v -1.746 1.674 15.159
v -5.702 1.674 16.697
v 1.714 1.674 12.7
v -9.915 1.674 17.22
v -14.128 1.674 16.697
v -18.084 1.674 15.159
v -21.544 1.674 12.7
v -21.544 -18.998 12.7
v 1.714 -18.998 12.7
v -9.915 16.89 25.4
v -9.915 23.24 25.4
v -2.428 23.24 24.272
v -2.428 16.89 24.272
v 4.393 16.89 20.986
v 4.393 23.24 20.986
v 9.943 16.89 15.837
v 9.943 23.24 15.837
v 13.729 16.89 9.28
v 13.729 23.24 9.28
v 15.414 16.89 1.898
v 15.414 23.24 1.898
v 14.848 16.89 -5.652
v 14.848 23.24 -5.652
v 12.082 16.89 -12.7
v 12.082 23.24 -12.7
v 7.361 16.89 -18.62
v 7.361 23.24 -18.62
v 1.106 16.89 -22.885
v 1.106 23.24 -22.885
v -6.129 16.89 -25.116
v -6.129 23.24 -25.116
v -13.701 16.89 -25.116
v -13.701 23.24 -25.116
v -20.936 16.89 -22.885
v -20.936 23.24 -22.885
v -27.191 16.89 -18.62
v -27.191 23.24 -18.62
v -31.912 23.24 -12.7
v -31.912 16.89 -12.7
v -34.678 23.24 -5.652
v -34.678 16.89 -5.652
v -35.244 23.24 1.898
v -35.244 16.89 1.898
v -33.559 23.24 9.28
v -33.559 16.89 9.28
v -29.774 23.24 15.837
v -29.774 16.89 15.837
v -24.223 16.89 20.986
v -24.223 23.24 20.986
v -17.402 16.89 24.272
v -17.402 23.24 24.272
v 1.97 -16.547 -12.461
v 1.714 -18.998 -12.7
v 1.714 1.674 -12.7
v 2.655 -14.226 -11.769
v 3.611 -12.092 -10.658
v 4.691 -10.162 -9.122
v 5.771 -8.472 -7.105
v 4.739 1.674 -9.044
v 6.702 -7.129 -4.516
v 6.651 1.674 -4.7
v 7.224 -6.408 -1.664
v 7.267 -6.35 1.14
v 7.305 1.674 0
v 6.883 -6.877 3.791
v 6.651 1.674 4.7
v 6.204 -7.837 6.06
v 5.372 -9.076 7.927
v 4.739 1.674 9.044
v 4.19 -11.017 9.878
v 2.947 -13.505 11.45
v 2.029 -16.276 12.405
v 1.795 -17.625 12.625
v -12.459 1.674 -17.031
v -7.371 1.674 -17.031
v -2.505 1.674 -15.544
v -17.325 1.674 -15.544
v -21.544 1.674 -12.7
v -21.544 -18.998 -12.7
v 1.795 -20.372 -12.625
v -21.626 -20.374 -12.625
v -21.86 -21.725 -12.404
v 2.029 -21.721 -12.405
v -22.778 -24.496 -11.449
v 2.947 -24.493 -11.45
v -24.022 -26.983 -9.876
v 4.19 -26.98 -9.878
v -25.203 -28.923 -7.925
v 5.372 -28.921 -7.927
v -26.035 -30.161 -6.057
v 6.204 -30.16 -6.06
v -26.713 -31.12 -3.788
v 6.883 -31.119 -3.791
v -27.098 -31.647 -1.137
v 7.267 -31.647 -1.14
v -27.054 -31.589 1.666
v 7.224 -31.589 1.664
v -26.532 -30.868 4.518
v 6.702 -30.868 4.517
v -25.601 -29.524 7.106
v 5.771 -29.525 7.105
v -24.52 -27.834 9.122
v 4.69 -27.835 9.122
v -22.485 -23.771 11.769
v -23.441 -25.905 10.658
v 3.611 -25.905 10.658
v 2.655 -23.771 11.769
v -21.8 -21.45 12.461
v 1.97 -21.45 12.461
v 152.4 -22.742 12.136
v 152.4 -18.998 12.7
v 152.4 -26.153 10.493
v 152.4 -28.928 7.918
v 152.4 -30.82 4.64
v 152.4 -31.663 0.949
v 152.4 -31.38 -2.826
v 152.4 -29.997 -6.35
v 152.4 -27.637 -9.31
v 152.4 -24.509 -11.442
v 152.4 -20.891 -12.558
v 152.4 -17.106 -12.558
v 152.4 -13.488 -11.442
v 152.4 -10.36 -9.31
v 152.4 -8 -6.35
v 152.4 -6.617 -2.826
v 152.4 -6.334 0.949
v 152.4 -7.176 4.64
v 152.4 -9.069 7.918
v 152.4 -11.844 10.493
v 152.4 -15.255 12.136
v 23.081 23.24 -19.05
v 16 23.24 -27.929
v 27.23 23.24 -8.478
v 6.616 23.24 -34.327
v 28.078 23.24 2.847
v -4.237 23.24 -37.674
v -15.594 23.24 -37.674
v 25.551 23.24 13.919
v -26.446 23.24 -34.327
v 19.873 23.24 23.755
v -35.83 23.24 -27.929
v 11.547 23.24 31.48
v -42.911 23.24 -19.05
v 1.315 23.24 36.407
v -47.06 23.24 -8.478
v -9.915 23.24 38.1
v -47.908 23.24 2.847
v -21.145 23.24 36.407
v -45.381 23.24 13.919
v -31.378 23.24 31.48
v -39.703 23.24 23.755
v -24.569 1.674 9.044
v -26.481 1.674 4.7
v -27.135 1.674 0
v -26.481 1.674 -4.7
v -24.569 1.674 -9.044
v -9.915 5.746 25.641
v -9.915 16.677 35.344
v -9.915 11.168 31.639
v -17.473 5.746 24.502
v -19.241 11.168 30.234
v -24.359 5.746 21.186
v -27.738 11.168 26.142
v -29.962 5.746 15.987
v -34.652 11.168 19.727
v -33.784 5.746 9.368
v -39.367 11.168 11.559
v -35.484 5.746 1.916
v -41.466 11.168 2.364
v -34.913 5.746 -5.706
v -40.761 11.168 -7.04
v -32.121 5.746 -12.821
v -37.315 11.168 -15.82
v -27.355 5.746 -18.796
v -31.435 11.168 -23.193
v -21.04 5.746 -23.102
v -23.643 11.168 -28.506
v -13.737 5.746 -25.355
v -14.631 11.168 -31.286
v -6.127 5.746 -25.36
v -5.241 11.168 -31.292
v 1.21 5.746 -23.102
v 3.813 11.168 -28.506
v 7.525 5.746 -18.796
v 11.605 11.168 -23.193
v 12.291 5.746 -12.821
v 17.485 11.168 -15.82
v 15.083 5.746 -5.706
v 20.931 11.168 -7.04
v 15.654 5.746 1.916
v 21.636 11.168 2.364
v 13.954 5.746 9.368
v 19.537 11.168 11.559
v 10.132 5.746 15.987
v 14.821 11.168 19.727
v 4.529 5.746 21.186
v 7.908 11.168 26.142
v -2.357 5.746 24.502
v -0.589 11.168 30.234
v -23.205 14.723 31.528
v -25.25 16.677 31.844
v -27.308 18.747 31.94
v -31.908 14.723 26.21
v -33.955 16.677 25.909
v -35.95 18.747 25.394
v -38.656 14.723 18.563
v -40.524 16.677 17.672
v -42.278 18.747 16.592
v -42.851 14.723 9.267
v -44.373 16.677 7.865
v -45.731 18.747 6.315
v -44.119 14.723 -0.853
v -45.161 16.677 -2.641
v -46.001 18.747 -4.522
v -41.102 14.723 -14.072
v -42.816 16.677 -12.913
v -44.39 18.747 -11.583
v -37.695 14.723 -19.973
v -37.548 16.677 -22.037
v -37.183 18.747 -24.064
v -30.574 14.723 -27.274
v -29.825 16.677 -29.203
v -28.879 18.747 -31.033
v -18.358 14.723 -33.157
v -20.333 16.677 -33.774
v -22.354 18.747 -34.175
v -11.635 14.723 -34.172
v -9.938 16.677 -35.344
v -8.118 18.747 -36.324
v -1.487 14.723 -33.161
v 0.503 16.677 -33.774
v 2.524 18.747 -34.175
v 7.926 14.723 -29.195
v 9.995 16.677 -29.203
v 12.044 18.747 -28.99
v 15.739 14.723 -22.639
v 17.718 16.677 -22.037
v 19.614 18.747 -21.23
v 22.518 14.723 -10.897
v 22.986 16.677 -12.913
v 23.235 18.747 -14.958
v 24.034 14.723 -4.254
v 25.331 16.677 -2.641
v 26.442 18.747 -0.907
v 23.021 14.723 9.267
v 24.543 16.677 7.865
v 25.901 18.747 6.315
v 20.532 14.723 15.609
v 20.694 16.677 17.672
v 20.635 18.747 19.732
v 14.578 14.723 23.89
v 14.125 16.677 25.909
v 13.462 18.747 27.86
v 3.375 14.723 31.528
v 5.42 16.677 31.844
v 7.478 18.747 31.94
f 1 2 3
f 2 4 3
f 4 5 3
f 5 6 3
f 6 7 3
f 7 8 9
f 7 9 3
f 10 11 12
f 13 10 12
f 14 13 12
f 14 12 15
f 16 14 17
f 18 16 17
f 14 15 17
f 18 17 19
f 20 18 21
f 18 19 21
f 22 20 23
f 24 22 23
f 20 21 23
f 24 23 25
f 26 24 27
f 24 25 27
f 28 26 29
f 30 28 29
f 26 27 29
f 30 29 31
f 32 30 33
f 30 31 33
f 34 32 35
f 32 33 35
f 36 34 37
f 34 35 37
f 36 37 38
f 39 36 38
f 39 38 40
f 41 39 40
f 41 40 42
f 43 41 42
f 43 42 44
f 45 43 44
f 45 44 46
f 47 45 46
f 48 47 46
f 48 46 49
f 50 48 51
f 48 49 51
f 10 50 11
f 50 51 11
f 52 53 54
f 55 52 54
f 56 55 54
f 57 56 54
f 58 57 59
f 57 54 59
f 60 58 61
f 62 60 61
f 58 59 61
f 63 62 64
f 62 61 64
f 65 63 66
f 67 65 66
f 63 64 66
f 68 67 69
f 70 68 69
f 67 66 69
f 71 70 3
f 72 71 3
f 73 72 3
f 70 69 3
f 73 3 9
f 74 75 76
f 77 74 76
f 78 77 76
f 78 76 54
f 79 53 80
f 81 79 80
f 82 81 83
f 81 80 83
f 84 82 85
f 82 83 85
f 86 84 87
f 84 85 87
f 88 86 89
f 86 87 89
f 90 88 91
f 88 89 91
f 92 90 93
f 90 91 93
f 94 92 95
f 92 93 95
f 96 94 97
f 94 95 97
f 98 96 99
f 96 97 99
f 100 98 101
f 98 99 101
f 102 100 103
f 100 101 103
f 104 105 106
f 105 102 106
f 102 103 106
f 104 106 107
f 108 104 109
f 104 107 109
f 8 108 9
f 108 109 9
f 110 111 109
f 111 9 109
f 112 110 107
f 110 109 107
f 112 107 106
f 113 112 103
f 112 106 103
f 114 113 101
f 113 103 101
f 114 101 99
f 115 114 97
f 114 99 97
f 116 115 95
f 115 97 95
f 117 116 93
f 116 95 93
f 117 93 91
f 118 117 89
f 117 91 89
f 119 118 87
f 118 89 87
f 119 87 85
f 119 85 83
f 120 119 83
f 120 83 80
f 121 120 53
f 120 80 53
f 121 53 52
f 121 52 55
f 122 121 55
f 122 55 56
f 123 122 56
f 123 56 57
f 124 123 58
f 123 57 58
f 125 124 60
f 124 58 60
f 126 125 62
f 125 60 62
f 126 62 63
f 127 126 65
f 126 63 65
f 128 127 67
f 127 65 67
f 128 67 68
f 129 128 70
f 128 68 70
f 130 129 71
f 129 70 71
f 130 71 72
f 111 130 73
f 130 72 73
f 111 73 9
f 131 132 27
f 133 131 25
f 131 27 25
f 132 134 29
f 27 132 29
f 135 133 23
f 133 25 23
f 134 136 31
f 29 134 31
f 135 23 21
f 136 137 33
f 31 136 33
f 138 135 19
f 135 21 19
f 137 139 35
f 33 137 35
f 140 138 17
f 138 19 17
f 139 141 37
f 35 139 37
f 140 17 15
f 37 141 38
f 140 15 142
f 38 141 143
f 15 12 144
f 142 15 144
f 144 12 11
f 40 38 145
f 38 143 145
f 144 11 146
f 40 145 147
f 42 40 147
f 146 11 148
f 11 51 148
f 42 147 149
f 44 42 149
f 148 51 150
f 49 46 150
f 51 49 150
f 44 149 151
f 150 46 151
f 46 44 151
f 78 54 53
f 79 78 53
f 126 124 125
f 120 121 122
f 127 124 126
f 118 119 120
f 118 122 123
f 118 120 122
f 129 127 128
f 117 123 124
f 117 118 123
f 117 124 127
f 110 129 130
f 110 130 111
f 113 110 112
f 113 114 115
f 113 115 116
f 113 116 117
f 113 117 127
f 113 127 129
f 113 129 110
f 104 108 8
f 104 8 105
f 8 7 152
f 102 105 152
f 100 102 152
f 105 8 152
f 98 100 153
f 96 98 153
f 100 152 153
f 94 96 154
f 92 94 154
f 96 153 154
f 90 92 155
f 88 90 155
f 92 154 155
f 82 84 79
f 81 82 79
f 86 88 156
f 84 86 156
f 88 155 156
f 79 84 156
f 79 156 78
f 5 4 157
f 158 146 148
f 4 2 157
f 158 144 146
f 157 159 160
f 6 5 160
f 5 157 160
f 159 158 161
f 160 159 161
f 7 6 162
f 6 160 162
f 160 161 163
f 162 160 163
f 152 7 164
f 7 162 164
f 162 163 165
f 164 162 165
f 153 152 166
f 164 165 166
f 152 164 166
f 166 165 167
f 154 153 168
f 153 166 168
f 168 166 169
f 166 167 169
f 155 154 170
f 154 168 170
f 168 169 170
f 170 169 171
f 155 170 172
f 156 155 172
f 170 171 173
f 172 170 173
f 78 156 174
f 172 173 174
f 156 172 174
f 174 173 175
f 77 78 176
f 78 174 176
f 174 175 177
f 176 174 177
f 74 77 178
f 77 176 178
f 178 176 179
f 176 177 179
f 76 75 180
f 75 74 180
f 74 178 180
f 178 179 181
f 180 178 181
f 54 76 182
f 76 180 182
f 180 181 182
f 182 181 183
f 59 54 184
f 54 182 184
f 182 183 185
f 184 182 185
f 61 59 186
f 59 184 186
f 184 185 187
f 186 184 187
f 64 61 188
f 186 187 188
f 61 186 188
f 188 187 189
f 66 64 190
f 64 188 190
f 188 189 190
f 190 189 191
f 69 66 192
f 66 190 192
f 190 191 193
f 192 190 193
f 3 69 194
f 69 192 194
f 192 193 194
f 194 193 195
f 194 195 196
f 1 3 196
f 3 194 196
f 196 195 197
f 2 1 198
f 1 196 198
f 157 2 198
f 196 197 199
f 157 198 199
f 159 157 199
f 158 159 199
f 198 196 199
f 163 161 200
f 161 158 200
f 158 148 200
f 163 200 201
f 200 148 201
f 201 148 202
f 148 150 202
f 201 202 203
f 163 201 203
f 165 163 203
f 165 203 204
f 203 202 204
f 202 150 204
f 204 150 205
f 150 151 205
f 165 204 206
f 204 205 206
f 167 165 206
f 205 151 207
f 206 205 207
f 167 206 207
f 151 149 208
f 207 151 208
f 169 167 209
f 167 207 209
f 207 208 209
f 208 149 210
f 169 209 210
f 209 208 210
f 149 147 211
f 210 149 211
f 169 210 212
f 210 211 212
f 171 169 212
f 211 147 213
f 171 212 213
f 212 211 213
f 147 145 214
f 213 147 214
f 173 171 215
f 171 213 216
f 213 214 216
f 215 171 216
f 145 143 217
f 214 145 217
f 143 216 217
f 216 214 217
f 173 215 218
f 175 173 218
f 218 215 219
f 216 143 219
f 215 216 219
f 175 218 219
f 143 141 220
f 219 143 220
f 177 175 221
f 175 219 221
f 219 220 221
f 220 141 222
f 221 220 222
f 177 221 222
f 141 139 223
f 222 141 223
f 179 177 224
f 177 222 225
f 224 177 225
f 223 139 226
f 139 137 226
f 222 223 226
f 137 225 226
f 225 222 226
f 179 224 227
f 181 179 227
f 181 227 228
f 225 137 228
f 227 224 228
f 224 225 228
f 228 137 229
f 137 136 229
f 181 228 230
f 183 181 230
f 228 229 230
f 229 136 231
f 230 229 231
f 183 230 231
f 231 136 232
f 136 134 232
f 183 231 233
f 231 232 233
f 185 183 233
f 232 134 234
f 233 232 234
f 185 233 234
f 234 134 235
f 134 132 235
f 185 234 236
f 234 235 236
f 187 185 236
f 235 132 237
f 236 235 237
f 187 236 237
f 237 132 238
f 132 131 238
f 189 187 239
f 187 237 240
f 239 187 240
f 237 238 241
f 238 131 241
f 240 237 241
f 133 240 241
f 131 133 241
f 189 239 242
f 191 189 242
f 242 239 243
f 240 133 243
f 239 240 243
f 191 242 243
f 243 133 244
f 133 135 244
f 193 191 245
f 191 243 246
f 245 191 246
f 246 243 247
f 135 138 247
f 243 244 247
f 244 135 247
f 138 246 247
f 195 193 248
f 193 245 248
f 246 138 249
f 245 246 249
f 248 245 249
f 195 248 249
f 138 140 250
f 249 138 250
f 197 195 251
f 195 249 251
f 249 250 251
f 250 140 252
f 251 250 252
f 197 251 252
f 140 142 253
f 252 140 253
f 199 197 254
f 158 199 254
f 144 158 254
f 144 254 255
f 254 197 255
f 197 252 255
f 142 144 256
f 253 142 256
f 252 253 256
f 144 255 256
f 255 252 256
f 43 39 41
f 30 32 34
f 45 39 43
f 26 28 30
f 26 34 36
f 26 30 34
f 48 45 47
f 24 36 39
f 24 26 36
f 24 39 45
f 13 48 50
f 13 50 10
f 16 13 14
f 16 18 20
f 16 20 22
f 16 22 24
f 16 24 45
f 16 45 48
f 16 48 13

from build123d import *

# Parameters (mm, degrees)
BOSS_EXTRUDE1_DEPTH      = 50.8
BOSS_EXTRUDE1_DEPTH_BACK = 101.6
SKETCH2_R                = 12.7
CUT_EXTRUDE2_DEPTH       = 159.628919589
SKETCH4_R                = 25.4
CUT_EXTRUDE3_DEPTH       = 6.35


with BuildPart() as part:
    # Sketch1 → Revolve1 (revolve)
    with BuildSketch(Plane.XY, mode=Mode.PRIVATE) as revolve1_sk:
        with BuildLine():
            Line((28.184971871, 23.240239964), (-9.915028129, 23.240239964))
            Line((-9.915028129, 23.240239964), (-9.915028129, -36.426191716))
            Line((-9.915028129, -36.426191716), (7.305080495, -36.426191716))
            Line((7.305080495, -36.426191716), (7.305080495, 1.673808284))
            add(Edge.make_bspline(
                [(7.305080495, 1.673808284), (17.688890223, 5.05702424), (24.648854015, 12.2458348), (28.184971871, 23.240239964)],
                knots=[0.179471998, 0.179471998, 0.179471998, 0.179471998, 1, 1, 1, 1], degree=3))
        make_face()
    revolve(revolve1_sk.sketch.rotate(Axis((-9.915028129, 23.240239964, 0), (0, -1, 0)), 90), axis=Axis((-9.915028129, 23.240239964, 0), (0, -1, 0)))

    # Sketch2 → Boss-Extrude1 (add, two sides: drawn at the far end of the back side and taken through both)
    with BuildSketch(Plane(origin=(101.6, 0, 0), x_dir=(0, 0, -1), z_dir=(1, 0, 0)).offset(-BOSS_EXTRUDE1_DEPTH_BACK)):
        with Locations(Location((0, -18.998368254, 0), (0, 0, 180))):
            Circle(SKETCH2_R)
    extrude(amount=BOSS_EXTRUDE1_DEPTH + BOSS_EXTRUDE1_DEPTH_BACK)

    # Sketch3 → Cut-Extrude2 (cut, through all)
    with BuildSketch(Plane(origin=(101.6, 0, 0), x_dir=(0, 0, -1), z_dir=(1, 0, 0))):
        with BuildLine():
            Line((17.220108624, -36.426191716), (17.220108624, -18.998368254))
            Line((17.220108624, -18.998368254), (17.220108624, 1.673808284))
            Line((17.220108624, 1.673808284), (12.7, 1.673808284))
            Line((12.7, 1.673808284), (12.7, -18.998368254))
            ThreePointArc((12.7, -18.998368254), (0, -31.698368254), (-12.7, -18.998368254))
            Line((-12.7, -18.998368254), (-12.7, 1.673808284))
            Line((-12.7, 1.673808284), (-17.220108624, 1.673808284))
            Line((-17.220108624, 1.673808284), (-17.220108624, -18.998368254))
            Line((-17.220108624, -18.998368254), (-17.220108624, -36.426191716))
            Line((-17.220108624, -36.426191716), (17.220108624, -36.426191716))
        make_face()
    extrude(amount=-CUT_EXTRUDE2_DEPTH, mode=Mode.SUBTRACT)

    # Sketch4 → Cut-Extrude3 (cut)
    with BuildSketch(Plane(origin=(0, 23.240239964, 0), x_dir=(1, 0, 0), z_dir=(0, 1, 0))):
        with Locations(Location((-9.915028129, 0, 0), (0, 0, 270))):
            Circle(SKETCH4_R)
    extrude(amount=-CUT_EXTRUDE3_DEPTH, mode=Mode.SUBTRACT)


solid = part.part
